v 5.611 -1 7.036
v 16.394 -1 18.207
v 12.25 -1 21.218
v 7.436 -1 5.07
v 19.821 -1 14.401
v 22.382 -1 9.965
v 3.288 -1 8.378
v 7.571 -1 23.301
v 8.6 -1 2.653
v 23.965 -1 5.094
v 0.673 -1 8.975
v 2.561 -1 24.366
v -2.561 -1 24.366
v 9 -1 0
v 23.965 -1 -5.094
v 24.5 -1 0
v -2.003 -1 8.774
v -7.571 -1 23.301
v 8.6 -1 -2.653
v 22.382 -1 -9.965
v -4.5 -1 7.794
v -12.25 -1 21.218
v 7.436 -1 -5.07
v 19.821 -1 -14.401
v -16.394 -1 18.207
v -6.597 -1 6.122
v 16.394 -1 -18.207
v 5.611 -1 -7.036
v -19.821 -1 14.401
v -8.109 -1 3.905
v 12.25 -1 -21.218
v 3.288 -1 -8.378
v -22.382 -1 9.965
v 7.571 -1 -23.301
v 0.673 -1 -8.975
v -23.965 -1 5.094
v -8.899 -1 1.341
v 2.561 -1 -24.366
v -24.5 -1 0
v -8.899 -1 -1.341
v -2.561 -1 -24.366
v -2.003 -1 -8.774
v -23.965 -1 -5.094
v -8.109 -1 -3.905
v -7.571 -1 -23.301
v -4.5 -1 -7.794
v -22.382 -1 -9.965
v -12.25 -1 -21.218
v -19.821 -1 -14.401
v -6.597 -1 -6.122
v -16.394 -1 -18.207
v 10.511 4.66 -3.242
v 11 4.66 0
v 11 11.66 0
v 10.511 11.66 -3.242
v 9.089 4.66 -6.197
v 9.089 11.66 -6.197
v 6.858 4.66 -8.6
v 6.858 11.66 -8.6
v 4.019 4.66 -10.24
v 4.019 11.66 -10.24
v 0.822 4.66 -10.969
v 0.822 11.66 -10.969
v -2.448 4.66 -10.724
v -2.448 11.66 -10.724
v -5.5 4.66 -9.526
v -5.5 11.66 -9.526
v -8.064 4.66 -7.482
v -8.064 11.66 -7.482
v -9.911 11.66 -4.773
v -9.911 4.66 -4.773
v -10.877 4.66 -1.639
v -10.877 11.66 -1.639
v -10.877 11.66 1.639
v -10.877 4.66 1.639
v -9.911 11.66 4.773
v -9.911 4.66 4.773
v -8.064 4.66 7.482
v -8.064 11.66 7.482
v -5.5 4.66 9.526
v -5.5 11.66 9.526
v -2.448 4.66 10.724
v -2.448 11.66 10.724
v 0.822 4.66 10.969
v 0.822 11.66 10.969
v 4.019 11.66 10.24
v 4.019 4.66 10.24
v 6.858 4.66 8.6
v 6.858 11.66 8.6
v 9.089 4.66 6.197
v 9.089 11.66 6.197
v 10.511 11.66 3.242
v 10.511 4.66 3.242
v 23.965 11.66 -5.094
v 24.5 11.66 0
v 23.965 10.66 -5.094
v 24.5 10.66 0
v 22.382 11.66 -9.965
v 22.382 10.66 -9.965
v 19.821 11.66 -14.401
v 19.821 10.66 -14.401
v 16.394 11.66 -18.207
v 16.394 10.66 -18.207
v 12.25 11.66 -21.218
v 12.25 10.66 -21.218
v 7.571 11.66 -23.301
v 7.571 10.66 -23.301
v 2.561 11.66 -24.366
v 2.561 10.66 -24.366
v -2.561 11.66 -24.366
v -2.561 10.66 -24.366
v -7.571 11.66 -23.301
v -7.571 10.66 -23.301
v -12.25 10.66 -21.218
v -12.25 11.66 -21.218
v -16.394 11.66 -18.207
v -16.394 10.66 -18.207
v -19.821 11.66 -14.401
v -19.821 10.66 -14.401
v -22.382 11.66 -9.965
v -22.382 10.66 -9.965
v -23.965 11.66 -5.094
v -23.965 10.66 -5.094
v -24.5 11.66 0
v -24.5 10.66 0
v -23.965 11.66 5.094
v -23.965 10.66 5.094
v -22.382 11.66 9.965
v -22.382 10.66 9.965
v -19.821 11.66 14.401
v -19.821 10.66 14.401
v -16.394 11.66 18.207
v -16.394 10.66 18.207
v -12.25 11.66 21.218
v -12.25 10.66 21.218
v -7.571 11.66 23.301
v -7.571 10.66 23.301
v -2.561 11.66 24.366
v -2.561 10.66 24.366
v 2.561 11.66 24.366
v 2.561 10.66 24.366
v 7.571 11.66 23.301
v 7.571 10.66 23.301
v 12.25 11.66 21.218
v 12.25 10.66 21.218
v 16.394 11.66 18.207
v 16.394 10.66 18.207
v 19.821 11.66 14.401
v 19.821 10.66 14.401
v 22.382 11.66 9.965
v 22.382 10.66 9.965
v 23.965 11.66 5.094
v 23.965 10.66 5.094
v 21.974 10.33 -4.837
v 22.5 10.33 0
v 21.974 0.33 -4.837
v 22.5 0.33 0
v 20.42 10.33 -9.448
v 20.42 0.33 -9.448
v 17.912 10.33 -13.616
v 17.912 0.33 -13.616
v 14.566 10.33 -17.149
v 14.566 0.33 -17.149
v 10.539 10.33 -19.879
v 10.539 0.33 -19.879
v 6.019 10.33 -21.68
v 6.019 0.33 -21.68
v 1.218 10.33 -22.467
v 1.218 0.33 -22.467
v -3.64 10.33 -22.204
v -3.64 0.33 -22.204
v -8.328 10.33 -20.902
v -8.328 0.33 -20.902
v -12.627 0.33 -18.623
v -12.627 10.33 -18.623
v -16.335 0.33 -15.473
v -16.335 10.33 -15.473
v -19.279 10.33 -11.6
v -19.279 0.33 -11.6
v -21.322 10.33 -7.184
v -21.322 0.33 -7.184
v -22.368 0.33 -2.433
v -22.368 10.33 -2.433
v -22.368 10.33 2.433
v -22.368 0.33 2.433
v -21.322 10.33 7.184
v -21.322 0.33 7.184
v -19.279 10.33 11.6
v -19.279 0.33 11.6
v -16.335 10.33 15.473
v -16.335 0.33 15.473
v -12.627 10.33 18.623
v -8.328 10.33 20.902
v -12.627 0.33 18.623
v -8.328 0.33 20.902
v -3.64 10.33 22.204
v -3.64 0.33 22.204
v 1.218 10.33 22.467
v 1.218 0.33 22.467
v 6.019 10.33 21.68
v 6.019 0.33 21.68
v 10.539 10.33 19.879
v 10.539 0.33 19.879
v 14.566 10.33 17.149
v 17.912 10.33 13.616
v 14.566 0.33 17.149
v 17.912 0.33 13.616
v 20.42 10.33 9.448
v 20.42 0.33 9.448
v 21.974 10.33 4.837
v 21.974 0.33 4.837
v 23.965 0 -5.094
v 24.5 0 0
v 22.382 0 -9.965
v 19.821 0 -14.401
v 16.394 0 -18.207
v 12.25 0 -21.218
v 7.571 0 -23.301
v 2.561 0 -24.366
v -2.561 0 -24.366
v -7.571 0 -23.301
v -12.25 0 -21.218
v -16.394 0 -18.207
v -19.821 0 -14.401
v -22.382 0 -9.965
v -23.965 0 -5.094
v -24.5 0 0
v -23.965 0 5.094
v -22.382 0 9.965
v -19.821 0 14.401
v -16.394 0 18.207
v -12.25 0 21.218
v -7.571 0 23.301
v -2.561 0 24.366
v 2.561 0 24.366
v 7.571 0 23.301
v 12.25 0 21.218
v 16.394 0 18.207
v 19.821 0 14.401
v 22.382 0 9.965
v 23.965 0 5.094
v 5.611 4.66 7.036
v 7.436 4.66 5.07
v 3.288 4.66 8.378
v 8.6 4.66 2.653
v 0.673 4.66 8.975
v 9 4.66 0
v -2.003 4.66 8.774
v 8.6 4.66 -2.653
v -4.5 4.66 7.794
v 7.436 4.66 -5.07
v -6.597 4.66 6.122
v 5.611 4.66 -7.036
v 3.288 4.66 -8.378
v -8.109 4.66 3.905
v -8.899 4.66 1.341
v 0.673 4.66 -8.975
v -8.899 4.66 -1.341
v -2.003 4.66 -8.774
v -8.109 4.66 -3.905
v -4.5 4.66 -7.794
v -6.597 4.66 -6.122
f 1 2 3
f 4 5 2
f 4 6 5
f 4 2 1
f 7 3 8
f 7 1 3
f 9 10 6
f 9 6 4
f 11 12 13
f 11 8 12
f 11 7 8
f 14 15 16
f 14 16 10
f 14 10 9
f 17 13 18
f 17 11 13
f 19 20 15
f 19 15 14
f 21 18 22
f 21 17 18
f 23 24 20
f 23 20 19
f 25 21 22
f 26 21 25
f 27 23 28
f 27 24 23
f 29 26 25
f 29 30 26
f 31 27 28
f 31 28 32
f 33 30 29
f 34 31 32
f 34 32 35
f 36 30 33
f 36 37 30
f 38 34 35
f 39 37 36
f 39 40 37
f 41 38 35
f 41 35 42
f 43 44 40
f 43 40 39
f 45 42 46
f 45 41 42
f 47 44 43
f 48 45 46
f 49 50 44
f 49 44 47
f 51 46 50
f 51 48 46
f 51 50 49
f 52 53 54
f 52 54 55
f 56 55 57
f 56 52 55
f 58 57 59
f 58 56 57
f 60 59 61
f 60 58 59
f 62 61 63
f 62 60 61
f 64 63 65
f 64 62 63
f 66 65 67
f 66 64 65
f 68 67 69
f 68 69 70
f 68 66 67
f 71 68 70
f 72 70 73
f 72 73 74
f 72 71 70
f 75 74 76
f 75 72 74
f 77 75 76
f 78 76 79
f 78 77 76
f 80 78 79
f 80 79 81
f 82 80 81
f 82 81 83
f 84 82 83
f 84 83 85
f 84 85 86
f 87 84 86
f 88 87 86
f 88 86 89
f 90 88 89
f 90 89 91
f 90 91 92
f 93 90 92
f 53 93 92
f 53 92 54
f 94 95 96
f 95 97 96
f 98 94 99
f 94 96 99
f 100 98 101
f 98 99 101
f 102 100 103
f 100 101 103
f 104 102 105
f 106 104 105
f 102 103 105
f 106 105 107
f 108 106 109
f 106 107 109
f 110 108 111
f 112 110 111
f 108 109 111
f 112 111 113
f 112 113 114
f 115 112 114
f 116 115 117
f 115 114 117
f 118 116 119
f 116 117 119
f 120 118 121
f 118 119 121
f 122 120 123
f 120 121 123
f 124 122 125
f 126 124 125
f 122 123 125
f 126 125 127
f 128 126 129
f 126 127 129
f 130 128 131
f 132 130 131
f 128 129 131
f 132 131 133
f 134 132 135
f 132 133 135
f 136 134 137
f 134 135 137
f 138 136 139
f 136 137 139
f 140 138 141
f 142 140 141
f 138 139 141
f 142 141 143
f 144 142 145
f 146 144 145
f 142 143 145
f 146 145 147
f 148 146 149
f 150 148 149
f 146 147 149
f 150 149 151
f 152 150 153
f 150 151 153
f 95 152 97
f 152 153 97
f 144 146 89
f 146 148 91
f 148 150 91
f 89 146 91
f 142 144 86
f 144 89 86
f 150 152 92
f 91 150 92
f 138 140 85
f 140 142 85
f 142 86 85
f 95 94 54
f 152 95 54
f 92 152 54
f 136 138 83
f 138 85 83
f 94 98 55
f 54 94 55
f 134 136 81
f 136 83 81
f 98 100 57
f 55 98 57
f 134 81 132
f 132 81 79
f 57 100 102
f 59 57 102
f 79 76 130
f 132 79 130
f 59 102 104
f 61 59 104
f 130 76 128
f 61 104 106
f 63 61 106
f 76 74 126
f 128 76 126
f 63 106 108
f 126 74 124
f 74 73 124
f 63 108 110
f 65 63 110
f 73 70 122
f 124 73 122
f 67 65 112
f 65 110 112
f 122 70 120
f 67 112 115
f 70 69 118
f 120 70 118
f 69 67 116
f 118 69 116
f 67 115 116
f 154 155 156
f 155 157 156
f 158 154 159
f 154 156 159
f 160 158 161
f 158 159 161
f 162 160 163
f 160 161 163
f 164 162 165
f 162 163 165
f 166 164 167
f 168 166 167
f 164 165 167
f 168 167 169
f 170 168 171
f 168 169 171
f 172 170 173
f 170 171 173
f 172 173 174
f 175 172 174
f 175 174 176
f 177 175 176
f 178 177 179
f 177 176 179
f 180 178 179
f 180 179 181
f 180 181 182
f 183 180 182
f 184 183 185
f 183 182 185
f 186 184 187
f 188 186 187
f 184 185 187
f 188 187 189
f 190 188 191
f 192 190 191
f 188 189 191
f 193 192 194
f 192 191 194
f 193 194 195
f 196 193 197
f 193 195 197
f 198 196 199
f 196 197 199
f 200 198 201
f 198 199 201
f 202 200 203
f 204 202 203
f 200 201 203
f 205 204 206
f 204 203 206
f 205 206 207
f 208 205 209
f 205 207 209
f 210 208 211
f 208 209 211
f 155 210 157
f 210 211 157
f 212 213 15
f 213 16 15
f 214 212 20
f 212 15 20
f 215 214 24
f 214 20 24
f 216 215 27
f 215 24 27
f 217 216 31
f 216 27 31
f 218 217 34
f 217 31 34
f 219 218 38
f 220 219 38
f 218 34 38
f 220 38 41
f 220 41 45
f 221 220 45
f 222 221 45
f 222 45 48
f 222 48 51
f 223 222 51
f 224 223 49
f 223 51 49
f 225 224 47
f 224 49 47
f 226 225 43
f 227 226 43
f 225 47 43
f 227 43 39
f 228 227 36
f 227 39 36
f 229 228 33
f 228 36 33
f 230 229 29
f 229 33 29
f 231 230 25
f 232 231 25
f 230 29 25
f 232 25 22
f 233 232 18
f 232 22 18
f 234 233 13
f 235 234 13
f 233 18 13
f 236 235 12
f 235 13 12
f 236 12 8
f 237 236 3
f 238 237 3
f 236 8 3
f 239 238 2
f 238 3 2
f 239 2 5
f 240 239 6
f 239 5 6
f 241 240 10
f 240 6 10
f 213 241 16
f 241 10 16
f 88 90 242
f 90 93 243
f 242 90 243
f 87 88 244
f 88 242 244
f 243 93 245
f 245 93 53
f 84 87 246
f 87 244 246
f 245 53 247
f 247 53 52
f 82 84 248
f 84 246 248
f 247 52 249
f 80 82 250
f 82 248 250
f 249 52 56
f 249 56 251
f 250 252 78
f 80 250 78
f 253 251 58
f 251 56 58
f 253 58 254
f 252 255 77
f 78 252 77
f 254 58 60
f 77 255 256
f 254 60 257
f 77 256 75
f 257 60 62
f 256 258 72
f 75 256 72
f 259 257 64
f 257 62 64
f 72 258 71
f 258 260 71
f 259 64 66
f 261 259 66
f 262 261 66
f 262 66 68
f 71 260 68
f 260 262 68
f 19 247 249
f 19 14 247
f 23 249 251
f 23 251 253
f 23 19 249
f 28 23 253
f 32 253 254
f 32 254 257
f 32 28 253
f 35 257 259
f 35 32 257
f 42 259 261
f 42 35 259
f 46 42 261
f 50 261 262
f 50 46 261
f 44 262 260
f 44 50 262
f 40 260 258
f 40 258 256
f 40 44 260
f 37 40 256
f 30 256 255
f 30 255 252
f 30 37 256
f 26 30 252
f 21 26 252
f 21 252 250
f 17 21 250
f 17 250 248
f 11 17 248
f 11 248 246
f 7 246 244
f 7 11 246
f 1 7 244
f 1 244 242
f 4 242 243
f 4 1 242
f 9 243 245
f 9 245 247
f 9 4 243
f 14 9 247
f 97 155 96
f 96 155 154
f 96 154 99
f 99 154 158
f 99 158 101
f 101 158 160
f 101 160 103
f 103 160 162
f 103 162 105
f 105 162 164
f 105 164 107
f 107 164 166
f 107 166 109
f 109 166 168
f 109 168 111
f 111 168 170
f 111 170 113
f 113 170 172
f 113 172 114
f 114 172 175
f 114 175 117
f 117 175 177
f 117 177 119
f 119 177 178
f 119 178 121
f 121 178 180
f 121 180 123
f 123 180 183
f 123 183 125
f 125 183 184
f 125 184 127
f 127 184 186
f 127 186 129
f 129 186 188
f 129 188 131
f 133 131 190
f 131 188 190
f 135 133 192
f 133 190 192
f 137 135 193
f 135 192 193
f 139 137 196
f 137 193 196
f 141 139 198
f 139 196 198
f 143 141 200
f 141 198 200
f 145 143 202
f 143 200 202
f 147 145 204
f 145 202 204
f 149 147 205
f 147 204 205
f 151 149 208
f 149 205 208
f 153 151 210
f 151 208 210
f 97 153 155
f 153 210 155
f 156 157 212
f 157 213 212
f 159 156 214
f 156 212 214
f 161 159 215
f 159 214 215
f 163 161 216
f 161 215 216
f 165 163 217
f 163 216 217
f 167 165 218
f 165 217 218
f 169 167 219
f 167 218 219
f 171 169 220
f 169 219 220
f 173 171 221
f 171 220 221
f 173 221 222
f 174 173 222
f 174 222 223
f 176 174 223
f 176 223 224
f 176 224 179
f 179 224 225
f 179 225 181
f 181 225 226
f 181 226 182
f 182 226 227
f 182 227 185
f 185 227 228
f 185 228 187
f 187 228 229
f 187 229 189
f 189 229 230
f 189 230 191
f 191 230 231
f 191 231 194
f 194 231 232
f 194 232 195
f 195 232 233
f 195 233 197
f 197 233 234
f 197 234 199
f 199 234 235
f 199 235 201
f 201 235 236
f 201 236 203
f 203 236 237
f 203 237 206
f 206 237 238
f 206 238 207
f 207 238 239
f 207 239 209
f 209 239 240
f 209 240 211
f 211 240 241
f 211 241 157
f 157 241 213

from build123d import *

# Parameters (mm, degrees)
SKETCH1_R           = 22.5
SKETCH1_R_2         = 11
BOSS_EXTRUDE1_DEPTH = 11.66


with BuildPart() as part:
    # Sketch1 → Boss-Extrude1 (new body)
    with BuildSketch(Plane(origin=(0, 0, 0), x_dir=(1, 0, 0), z_dir=(0, 1, 0))):
        Circle(SKETCH1_R)
        Circle(SKETCH1_R_2, mode=Mode.SUBTRACT)
    extrude(amount=BOSS_EXTRUDE1_DEPTH)

    # Sketch2 → Revolve1 (revolve)
    with BuildSketch(Plane.XY):
        Polygon((22.5, 11.66), (24.5, 11.66), (24.5, 10.66), (22.5, 10.33), align=None)
        Polygon((22.5, 0.33), (24.5, 0), (24.5, -1), (22.5, -1), (9, -1), (9, 0.33), (9, 4.66), (22.5, 4.66), align=None)
    revolve(axis=Axis((0, 0, 0), (0, 1, 0)))


solid = part.part
